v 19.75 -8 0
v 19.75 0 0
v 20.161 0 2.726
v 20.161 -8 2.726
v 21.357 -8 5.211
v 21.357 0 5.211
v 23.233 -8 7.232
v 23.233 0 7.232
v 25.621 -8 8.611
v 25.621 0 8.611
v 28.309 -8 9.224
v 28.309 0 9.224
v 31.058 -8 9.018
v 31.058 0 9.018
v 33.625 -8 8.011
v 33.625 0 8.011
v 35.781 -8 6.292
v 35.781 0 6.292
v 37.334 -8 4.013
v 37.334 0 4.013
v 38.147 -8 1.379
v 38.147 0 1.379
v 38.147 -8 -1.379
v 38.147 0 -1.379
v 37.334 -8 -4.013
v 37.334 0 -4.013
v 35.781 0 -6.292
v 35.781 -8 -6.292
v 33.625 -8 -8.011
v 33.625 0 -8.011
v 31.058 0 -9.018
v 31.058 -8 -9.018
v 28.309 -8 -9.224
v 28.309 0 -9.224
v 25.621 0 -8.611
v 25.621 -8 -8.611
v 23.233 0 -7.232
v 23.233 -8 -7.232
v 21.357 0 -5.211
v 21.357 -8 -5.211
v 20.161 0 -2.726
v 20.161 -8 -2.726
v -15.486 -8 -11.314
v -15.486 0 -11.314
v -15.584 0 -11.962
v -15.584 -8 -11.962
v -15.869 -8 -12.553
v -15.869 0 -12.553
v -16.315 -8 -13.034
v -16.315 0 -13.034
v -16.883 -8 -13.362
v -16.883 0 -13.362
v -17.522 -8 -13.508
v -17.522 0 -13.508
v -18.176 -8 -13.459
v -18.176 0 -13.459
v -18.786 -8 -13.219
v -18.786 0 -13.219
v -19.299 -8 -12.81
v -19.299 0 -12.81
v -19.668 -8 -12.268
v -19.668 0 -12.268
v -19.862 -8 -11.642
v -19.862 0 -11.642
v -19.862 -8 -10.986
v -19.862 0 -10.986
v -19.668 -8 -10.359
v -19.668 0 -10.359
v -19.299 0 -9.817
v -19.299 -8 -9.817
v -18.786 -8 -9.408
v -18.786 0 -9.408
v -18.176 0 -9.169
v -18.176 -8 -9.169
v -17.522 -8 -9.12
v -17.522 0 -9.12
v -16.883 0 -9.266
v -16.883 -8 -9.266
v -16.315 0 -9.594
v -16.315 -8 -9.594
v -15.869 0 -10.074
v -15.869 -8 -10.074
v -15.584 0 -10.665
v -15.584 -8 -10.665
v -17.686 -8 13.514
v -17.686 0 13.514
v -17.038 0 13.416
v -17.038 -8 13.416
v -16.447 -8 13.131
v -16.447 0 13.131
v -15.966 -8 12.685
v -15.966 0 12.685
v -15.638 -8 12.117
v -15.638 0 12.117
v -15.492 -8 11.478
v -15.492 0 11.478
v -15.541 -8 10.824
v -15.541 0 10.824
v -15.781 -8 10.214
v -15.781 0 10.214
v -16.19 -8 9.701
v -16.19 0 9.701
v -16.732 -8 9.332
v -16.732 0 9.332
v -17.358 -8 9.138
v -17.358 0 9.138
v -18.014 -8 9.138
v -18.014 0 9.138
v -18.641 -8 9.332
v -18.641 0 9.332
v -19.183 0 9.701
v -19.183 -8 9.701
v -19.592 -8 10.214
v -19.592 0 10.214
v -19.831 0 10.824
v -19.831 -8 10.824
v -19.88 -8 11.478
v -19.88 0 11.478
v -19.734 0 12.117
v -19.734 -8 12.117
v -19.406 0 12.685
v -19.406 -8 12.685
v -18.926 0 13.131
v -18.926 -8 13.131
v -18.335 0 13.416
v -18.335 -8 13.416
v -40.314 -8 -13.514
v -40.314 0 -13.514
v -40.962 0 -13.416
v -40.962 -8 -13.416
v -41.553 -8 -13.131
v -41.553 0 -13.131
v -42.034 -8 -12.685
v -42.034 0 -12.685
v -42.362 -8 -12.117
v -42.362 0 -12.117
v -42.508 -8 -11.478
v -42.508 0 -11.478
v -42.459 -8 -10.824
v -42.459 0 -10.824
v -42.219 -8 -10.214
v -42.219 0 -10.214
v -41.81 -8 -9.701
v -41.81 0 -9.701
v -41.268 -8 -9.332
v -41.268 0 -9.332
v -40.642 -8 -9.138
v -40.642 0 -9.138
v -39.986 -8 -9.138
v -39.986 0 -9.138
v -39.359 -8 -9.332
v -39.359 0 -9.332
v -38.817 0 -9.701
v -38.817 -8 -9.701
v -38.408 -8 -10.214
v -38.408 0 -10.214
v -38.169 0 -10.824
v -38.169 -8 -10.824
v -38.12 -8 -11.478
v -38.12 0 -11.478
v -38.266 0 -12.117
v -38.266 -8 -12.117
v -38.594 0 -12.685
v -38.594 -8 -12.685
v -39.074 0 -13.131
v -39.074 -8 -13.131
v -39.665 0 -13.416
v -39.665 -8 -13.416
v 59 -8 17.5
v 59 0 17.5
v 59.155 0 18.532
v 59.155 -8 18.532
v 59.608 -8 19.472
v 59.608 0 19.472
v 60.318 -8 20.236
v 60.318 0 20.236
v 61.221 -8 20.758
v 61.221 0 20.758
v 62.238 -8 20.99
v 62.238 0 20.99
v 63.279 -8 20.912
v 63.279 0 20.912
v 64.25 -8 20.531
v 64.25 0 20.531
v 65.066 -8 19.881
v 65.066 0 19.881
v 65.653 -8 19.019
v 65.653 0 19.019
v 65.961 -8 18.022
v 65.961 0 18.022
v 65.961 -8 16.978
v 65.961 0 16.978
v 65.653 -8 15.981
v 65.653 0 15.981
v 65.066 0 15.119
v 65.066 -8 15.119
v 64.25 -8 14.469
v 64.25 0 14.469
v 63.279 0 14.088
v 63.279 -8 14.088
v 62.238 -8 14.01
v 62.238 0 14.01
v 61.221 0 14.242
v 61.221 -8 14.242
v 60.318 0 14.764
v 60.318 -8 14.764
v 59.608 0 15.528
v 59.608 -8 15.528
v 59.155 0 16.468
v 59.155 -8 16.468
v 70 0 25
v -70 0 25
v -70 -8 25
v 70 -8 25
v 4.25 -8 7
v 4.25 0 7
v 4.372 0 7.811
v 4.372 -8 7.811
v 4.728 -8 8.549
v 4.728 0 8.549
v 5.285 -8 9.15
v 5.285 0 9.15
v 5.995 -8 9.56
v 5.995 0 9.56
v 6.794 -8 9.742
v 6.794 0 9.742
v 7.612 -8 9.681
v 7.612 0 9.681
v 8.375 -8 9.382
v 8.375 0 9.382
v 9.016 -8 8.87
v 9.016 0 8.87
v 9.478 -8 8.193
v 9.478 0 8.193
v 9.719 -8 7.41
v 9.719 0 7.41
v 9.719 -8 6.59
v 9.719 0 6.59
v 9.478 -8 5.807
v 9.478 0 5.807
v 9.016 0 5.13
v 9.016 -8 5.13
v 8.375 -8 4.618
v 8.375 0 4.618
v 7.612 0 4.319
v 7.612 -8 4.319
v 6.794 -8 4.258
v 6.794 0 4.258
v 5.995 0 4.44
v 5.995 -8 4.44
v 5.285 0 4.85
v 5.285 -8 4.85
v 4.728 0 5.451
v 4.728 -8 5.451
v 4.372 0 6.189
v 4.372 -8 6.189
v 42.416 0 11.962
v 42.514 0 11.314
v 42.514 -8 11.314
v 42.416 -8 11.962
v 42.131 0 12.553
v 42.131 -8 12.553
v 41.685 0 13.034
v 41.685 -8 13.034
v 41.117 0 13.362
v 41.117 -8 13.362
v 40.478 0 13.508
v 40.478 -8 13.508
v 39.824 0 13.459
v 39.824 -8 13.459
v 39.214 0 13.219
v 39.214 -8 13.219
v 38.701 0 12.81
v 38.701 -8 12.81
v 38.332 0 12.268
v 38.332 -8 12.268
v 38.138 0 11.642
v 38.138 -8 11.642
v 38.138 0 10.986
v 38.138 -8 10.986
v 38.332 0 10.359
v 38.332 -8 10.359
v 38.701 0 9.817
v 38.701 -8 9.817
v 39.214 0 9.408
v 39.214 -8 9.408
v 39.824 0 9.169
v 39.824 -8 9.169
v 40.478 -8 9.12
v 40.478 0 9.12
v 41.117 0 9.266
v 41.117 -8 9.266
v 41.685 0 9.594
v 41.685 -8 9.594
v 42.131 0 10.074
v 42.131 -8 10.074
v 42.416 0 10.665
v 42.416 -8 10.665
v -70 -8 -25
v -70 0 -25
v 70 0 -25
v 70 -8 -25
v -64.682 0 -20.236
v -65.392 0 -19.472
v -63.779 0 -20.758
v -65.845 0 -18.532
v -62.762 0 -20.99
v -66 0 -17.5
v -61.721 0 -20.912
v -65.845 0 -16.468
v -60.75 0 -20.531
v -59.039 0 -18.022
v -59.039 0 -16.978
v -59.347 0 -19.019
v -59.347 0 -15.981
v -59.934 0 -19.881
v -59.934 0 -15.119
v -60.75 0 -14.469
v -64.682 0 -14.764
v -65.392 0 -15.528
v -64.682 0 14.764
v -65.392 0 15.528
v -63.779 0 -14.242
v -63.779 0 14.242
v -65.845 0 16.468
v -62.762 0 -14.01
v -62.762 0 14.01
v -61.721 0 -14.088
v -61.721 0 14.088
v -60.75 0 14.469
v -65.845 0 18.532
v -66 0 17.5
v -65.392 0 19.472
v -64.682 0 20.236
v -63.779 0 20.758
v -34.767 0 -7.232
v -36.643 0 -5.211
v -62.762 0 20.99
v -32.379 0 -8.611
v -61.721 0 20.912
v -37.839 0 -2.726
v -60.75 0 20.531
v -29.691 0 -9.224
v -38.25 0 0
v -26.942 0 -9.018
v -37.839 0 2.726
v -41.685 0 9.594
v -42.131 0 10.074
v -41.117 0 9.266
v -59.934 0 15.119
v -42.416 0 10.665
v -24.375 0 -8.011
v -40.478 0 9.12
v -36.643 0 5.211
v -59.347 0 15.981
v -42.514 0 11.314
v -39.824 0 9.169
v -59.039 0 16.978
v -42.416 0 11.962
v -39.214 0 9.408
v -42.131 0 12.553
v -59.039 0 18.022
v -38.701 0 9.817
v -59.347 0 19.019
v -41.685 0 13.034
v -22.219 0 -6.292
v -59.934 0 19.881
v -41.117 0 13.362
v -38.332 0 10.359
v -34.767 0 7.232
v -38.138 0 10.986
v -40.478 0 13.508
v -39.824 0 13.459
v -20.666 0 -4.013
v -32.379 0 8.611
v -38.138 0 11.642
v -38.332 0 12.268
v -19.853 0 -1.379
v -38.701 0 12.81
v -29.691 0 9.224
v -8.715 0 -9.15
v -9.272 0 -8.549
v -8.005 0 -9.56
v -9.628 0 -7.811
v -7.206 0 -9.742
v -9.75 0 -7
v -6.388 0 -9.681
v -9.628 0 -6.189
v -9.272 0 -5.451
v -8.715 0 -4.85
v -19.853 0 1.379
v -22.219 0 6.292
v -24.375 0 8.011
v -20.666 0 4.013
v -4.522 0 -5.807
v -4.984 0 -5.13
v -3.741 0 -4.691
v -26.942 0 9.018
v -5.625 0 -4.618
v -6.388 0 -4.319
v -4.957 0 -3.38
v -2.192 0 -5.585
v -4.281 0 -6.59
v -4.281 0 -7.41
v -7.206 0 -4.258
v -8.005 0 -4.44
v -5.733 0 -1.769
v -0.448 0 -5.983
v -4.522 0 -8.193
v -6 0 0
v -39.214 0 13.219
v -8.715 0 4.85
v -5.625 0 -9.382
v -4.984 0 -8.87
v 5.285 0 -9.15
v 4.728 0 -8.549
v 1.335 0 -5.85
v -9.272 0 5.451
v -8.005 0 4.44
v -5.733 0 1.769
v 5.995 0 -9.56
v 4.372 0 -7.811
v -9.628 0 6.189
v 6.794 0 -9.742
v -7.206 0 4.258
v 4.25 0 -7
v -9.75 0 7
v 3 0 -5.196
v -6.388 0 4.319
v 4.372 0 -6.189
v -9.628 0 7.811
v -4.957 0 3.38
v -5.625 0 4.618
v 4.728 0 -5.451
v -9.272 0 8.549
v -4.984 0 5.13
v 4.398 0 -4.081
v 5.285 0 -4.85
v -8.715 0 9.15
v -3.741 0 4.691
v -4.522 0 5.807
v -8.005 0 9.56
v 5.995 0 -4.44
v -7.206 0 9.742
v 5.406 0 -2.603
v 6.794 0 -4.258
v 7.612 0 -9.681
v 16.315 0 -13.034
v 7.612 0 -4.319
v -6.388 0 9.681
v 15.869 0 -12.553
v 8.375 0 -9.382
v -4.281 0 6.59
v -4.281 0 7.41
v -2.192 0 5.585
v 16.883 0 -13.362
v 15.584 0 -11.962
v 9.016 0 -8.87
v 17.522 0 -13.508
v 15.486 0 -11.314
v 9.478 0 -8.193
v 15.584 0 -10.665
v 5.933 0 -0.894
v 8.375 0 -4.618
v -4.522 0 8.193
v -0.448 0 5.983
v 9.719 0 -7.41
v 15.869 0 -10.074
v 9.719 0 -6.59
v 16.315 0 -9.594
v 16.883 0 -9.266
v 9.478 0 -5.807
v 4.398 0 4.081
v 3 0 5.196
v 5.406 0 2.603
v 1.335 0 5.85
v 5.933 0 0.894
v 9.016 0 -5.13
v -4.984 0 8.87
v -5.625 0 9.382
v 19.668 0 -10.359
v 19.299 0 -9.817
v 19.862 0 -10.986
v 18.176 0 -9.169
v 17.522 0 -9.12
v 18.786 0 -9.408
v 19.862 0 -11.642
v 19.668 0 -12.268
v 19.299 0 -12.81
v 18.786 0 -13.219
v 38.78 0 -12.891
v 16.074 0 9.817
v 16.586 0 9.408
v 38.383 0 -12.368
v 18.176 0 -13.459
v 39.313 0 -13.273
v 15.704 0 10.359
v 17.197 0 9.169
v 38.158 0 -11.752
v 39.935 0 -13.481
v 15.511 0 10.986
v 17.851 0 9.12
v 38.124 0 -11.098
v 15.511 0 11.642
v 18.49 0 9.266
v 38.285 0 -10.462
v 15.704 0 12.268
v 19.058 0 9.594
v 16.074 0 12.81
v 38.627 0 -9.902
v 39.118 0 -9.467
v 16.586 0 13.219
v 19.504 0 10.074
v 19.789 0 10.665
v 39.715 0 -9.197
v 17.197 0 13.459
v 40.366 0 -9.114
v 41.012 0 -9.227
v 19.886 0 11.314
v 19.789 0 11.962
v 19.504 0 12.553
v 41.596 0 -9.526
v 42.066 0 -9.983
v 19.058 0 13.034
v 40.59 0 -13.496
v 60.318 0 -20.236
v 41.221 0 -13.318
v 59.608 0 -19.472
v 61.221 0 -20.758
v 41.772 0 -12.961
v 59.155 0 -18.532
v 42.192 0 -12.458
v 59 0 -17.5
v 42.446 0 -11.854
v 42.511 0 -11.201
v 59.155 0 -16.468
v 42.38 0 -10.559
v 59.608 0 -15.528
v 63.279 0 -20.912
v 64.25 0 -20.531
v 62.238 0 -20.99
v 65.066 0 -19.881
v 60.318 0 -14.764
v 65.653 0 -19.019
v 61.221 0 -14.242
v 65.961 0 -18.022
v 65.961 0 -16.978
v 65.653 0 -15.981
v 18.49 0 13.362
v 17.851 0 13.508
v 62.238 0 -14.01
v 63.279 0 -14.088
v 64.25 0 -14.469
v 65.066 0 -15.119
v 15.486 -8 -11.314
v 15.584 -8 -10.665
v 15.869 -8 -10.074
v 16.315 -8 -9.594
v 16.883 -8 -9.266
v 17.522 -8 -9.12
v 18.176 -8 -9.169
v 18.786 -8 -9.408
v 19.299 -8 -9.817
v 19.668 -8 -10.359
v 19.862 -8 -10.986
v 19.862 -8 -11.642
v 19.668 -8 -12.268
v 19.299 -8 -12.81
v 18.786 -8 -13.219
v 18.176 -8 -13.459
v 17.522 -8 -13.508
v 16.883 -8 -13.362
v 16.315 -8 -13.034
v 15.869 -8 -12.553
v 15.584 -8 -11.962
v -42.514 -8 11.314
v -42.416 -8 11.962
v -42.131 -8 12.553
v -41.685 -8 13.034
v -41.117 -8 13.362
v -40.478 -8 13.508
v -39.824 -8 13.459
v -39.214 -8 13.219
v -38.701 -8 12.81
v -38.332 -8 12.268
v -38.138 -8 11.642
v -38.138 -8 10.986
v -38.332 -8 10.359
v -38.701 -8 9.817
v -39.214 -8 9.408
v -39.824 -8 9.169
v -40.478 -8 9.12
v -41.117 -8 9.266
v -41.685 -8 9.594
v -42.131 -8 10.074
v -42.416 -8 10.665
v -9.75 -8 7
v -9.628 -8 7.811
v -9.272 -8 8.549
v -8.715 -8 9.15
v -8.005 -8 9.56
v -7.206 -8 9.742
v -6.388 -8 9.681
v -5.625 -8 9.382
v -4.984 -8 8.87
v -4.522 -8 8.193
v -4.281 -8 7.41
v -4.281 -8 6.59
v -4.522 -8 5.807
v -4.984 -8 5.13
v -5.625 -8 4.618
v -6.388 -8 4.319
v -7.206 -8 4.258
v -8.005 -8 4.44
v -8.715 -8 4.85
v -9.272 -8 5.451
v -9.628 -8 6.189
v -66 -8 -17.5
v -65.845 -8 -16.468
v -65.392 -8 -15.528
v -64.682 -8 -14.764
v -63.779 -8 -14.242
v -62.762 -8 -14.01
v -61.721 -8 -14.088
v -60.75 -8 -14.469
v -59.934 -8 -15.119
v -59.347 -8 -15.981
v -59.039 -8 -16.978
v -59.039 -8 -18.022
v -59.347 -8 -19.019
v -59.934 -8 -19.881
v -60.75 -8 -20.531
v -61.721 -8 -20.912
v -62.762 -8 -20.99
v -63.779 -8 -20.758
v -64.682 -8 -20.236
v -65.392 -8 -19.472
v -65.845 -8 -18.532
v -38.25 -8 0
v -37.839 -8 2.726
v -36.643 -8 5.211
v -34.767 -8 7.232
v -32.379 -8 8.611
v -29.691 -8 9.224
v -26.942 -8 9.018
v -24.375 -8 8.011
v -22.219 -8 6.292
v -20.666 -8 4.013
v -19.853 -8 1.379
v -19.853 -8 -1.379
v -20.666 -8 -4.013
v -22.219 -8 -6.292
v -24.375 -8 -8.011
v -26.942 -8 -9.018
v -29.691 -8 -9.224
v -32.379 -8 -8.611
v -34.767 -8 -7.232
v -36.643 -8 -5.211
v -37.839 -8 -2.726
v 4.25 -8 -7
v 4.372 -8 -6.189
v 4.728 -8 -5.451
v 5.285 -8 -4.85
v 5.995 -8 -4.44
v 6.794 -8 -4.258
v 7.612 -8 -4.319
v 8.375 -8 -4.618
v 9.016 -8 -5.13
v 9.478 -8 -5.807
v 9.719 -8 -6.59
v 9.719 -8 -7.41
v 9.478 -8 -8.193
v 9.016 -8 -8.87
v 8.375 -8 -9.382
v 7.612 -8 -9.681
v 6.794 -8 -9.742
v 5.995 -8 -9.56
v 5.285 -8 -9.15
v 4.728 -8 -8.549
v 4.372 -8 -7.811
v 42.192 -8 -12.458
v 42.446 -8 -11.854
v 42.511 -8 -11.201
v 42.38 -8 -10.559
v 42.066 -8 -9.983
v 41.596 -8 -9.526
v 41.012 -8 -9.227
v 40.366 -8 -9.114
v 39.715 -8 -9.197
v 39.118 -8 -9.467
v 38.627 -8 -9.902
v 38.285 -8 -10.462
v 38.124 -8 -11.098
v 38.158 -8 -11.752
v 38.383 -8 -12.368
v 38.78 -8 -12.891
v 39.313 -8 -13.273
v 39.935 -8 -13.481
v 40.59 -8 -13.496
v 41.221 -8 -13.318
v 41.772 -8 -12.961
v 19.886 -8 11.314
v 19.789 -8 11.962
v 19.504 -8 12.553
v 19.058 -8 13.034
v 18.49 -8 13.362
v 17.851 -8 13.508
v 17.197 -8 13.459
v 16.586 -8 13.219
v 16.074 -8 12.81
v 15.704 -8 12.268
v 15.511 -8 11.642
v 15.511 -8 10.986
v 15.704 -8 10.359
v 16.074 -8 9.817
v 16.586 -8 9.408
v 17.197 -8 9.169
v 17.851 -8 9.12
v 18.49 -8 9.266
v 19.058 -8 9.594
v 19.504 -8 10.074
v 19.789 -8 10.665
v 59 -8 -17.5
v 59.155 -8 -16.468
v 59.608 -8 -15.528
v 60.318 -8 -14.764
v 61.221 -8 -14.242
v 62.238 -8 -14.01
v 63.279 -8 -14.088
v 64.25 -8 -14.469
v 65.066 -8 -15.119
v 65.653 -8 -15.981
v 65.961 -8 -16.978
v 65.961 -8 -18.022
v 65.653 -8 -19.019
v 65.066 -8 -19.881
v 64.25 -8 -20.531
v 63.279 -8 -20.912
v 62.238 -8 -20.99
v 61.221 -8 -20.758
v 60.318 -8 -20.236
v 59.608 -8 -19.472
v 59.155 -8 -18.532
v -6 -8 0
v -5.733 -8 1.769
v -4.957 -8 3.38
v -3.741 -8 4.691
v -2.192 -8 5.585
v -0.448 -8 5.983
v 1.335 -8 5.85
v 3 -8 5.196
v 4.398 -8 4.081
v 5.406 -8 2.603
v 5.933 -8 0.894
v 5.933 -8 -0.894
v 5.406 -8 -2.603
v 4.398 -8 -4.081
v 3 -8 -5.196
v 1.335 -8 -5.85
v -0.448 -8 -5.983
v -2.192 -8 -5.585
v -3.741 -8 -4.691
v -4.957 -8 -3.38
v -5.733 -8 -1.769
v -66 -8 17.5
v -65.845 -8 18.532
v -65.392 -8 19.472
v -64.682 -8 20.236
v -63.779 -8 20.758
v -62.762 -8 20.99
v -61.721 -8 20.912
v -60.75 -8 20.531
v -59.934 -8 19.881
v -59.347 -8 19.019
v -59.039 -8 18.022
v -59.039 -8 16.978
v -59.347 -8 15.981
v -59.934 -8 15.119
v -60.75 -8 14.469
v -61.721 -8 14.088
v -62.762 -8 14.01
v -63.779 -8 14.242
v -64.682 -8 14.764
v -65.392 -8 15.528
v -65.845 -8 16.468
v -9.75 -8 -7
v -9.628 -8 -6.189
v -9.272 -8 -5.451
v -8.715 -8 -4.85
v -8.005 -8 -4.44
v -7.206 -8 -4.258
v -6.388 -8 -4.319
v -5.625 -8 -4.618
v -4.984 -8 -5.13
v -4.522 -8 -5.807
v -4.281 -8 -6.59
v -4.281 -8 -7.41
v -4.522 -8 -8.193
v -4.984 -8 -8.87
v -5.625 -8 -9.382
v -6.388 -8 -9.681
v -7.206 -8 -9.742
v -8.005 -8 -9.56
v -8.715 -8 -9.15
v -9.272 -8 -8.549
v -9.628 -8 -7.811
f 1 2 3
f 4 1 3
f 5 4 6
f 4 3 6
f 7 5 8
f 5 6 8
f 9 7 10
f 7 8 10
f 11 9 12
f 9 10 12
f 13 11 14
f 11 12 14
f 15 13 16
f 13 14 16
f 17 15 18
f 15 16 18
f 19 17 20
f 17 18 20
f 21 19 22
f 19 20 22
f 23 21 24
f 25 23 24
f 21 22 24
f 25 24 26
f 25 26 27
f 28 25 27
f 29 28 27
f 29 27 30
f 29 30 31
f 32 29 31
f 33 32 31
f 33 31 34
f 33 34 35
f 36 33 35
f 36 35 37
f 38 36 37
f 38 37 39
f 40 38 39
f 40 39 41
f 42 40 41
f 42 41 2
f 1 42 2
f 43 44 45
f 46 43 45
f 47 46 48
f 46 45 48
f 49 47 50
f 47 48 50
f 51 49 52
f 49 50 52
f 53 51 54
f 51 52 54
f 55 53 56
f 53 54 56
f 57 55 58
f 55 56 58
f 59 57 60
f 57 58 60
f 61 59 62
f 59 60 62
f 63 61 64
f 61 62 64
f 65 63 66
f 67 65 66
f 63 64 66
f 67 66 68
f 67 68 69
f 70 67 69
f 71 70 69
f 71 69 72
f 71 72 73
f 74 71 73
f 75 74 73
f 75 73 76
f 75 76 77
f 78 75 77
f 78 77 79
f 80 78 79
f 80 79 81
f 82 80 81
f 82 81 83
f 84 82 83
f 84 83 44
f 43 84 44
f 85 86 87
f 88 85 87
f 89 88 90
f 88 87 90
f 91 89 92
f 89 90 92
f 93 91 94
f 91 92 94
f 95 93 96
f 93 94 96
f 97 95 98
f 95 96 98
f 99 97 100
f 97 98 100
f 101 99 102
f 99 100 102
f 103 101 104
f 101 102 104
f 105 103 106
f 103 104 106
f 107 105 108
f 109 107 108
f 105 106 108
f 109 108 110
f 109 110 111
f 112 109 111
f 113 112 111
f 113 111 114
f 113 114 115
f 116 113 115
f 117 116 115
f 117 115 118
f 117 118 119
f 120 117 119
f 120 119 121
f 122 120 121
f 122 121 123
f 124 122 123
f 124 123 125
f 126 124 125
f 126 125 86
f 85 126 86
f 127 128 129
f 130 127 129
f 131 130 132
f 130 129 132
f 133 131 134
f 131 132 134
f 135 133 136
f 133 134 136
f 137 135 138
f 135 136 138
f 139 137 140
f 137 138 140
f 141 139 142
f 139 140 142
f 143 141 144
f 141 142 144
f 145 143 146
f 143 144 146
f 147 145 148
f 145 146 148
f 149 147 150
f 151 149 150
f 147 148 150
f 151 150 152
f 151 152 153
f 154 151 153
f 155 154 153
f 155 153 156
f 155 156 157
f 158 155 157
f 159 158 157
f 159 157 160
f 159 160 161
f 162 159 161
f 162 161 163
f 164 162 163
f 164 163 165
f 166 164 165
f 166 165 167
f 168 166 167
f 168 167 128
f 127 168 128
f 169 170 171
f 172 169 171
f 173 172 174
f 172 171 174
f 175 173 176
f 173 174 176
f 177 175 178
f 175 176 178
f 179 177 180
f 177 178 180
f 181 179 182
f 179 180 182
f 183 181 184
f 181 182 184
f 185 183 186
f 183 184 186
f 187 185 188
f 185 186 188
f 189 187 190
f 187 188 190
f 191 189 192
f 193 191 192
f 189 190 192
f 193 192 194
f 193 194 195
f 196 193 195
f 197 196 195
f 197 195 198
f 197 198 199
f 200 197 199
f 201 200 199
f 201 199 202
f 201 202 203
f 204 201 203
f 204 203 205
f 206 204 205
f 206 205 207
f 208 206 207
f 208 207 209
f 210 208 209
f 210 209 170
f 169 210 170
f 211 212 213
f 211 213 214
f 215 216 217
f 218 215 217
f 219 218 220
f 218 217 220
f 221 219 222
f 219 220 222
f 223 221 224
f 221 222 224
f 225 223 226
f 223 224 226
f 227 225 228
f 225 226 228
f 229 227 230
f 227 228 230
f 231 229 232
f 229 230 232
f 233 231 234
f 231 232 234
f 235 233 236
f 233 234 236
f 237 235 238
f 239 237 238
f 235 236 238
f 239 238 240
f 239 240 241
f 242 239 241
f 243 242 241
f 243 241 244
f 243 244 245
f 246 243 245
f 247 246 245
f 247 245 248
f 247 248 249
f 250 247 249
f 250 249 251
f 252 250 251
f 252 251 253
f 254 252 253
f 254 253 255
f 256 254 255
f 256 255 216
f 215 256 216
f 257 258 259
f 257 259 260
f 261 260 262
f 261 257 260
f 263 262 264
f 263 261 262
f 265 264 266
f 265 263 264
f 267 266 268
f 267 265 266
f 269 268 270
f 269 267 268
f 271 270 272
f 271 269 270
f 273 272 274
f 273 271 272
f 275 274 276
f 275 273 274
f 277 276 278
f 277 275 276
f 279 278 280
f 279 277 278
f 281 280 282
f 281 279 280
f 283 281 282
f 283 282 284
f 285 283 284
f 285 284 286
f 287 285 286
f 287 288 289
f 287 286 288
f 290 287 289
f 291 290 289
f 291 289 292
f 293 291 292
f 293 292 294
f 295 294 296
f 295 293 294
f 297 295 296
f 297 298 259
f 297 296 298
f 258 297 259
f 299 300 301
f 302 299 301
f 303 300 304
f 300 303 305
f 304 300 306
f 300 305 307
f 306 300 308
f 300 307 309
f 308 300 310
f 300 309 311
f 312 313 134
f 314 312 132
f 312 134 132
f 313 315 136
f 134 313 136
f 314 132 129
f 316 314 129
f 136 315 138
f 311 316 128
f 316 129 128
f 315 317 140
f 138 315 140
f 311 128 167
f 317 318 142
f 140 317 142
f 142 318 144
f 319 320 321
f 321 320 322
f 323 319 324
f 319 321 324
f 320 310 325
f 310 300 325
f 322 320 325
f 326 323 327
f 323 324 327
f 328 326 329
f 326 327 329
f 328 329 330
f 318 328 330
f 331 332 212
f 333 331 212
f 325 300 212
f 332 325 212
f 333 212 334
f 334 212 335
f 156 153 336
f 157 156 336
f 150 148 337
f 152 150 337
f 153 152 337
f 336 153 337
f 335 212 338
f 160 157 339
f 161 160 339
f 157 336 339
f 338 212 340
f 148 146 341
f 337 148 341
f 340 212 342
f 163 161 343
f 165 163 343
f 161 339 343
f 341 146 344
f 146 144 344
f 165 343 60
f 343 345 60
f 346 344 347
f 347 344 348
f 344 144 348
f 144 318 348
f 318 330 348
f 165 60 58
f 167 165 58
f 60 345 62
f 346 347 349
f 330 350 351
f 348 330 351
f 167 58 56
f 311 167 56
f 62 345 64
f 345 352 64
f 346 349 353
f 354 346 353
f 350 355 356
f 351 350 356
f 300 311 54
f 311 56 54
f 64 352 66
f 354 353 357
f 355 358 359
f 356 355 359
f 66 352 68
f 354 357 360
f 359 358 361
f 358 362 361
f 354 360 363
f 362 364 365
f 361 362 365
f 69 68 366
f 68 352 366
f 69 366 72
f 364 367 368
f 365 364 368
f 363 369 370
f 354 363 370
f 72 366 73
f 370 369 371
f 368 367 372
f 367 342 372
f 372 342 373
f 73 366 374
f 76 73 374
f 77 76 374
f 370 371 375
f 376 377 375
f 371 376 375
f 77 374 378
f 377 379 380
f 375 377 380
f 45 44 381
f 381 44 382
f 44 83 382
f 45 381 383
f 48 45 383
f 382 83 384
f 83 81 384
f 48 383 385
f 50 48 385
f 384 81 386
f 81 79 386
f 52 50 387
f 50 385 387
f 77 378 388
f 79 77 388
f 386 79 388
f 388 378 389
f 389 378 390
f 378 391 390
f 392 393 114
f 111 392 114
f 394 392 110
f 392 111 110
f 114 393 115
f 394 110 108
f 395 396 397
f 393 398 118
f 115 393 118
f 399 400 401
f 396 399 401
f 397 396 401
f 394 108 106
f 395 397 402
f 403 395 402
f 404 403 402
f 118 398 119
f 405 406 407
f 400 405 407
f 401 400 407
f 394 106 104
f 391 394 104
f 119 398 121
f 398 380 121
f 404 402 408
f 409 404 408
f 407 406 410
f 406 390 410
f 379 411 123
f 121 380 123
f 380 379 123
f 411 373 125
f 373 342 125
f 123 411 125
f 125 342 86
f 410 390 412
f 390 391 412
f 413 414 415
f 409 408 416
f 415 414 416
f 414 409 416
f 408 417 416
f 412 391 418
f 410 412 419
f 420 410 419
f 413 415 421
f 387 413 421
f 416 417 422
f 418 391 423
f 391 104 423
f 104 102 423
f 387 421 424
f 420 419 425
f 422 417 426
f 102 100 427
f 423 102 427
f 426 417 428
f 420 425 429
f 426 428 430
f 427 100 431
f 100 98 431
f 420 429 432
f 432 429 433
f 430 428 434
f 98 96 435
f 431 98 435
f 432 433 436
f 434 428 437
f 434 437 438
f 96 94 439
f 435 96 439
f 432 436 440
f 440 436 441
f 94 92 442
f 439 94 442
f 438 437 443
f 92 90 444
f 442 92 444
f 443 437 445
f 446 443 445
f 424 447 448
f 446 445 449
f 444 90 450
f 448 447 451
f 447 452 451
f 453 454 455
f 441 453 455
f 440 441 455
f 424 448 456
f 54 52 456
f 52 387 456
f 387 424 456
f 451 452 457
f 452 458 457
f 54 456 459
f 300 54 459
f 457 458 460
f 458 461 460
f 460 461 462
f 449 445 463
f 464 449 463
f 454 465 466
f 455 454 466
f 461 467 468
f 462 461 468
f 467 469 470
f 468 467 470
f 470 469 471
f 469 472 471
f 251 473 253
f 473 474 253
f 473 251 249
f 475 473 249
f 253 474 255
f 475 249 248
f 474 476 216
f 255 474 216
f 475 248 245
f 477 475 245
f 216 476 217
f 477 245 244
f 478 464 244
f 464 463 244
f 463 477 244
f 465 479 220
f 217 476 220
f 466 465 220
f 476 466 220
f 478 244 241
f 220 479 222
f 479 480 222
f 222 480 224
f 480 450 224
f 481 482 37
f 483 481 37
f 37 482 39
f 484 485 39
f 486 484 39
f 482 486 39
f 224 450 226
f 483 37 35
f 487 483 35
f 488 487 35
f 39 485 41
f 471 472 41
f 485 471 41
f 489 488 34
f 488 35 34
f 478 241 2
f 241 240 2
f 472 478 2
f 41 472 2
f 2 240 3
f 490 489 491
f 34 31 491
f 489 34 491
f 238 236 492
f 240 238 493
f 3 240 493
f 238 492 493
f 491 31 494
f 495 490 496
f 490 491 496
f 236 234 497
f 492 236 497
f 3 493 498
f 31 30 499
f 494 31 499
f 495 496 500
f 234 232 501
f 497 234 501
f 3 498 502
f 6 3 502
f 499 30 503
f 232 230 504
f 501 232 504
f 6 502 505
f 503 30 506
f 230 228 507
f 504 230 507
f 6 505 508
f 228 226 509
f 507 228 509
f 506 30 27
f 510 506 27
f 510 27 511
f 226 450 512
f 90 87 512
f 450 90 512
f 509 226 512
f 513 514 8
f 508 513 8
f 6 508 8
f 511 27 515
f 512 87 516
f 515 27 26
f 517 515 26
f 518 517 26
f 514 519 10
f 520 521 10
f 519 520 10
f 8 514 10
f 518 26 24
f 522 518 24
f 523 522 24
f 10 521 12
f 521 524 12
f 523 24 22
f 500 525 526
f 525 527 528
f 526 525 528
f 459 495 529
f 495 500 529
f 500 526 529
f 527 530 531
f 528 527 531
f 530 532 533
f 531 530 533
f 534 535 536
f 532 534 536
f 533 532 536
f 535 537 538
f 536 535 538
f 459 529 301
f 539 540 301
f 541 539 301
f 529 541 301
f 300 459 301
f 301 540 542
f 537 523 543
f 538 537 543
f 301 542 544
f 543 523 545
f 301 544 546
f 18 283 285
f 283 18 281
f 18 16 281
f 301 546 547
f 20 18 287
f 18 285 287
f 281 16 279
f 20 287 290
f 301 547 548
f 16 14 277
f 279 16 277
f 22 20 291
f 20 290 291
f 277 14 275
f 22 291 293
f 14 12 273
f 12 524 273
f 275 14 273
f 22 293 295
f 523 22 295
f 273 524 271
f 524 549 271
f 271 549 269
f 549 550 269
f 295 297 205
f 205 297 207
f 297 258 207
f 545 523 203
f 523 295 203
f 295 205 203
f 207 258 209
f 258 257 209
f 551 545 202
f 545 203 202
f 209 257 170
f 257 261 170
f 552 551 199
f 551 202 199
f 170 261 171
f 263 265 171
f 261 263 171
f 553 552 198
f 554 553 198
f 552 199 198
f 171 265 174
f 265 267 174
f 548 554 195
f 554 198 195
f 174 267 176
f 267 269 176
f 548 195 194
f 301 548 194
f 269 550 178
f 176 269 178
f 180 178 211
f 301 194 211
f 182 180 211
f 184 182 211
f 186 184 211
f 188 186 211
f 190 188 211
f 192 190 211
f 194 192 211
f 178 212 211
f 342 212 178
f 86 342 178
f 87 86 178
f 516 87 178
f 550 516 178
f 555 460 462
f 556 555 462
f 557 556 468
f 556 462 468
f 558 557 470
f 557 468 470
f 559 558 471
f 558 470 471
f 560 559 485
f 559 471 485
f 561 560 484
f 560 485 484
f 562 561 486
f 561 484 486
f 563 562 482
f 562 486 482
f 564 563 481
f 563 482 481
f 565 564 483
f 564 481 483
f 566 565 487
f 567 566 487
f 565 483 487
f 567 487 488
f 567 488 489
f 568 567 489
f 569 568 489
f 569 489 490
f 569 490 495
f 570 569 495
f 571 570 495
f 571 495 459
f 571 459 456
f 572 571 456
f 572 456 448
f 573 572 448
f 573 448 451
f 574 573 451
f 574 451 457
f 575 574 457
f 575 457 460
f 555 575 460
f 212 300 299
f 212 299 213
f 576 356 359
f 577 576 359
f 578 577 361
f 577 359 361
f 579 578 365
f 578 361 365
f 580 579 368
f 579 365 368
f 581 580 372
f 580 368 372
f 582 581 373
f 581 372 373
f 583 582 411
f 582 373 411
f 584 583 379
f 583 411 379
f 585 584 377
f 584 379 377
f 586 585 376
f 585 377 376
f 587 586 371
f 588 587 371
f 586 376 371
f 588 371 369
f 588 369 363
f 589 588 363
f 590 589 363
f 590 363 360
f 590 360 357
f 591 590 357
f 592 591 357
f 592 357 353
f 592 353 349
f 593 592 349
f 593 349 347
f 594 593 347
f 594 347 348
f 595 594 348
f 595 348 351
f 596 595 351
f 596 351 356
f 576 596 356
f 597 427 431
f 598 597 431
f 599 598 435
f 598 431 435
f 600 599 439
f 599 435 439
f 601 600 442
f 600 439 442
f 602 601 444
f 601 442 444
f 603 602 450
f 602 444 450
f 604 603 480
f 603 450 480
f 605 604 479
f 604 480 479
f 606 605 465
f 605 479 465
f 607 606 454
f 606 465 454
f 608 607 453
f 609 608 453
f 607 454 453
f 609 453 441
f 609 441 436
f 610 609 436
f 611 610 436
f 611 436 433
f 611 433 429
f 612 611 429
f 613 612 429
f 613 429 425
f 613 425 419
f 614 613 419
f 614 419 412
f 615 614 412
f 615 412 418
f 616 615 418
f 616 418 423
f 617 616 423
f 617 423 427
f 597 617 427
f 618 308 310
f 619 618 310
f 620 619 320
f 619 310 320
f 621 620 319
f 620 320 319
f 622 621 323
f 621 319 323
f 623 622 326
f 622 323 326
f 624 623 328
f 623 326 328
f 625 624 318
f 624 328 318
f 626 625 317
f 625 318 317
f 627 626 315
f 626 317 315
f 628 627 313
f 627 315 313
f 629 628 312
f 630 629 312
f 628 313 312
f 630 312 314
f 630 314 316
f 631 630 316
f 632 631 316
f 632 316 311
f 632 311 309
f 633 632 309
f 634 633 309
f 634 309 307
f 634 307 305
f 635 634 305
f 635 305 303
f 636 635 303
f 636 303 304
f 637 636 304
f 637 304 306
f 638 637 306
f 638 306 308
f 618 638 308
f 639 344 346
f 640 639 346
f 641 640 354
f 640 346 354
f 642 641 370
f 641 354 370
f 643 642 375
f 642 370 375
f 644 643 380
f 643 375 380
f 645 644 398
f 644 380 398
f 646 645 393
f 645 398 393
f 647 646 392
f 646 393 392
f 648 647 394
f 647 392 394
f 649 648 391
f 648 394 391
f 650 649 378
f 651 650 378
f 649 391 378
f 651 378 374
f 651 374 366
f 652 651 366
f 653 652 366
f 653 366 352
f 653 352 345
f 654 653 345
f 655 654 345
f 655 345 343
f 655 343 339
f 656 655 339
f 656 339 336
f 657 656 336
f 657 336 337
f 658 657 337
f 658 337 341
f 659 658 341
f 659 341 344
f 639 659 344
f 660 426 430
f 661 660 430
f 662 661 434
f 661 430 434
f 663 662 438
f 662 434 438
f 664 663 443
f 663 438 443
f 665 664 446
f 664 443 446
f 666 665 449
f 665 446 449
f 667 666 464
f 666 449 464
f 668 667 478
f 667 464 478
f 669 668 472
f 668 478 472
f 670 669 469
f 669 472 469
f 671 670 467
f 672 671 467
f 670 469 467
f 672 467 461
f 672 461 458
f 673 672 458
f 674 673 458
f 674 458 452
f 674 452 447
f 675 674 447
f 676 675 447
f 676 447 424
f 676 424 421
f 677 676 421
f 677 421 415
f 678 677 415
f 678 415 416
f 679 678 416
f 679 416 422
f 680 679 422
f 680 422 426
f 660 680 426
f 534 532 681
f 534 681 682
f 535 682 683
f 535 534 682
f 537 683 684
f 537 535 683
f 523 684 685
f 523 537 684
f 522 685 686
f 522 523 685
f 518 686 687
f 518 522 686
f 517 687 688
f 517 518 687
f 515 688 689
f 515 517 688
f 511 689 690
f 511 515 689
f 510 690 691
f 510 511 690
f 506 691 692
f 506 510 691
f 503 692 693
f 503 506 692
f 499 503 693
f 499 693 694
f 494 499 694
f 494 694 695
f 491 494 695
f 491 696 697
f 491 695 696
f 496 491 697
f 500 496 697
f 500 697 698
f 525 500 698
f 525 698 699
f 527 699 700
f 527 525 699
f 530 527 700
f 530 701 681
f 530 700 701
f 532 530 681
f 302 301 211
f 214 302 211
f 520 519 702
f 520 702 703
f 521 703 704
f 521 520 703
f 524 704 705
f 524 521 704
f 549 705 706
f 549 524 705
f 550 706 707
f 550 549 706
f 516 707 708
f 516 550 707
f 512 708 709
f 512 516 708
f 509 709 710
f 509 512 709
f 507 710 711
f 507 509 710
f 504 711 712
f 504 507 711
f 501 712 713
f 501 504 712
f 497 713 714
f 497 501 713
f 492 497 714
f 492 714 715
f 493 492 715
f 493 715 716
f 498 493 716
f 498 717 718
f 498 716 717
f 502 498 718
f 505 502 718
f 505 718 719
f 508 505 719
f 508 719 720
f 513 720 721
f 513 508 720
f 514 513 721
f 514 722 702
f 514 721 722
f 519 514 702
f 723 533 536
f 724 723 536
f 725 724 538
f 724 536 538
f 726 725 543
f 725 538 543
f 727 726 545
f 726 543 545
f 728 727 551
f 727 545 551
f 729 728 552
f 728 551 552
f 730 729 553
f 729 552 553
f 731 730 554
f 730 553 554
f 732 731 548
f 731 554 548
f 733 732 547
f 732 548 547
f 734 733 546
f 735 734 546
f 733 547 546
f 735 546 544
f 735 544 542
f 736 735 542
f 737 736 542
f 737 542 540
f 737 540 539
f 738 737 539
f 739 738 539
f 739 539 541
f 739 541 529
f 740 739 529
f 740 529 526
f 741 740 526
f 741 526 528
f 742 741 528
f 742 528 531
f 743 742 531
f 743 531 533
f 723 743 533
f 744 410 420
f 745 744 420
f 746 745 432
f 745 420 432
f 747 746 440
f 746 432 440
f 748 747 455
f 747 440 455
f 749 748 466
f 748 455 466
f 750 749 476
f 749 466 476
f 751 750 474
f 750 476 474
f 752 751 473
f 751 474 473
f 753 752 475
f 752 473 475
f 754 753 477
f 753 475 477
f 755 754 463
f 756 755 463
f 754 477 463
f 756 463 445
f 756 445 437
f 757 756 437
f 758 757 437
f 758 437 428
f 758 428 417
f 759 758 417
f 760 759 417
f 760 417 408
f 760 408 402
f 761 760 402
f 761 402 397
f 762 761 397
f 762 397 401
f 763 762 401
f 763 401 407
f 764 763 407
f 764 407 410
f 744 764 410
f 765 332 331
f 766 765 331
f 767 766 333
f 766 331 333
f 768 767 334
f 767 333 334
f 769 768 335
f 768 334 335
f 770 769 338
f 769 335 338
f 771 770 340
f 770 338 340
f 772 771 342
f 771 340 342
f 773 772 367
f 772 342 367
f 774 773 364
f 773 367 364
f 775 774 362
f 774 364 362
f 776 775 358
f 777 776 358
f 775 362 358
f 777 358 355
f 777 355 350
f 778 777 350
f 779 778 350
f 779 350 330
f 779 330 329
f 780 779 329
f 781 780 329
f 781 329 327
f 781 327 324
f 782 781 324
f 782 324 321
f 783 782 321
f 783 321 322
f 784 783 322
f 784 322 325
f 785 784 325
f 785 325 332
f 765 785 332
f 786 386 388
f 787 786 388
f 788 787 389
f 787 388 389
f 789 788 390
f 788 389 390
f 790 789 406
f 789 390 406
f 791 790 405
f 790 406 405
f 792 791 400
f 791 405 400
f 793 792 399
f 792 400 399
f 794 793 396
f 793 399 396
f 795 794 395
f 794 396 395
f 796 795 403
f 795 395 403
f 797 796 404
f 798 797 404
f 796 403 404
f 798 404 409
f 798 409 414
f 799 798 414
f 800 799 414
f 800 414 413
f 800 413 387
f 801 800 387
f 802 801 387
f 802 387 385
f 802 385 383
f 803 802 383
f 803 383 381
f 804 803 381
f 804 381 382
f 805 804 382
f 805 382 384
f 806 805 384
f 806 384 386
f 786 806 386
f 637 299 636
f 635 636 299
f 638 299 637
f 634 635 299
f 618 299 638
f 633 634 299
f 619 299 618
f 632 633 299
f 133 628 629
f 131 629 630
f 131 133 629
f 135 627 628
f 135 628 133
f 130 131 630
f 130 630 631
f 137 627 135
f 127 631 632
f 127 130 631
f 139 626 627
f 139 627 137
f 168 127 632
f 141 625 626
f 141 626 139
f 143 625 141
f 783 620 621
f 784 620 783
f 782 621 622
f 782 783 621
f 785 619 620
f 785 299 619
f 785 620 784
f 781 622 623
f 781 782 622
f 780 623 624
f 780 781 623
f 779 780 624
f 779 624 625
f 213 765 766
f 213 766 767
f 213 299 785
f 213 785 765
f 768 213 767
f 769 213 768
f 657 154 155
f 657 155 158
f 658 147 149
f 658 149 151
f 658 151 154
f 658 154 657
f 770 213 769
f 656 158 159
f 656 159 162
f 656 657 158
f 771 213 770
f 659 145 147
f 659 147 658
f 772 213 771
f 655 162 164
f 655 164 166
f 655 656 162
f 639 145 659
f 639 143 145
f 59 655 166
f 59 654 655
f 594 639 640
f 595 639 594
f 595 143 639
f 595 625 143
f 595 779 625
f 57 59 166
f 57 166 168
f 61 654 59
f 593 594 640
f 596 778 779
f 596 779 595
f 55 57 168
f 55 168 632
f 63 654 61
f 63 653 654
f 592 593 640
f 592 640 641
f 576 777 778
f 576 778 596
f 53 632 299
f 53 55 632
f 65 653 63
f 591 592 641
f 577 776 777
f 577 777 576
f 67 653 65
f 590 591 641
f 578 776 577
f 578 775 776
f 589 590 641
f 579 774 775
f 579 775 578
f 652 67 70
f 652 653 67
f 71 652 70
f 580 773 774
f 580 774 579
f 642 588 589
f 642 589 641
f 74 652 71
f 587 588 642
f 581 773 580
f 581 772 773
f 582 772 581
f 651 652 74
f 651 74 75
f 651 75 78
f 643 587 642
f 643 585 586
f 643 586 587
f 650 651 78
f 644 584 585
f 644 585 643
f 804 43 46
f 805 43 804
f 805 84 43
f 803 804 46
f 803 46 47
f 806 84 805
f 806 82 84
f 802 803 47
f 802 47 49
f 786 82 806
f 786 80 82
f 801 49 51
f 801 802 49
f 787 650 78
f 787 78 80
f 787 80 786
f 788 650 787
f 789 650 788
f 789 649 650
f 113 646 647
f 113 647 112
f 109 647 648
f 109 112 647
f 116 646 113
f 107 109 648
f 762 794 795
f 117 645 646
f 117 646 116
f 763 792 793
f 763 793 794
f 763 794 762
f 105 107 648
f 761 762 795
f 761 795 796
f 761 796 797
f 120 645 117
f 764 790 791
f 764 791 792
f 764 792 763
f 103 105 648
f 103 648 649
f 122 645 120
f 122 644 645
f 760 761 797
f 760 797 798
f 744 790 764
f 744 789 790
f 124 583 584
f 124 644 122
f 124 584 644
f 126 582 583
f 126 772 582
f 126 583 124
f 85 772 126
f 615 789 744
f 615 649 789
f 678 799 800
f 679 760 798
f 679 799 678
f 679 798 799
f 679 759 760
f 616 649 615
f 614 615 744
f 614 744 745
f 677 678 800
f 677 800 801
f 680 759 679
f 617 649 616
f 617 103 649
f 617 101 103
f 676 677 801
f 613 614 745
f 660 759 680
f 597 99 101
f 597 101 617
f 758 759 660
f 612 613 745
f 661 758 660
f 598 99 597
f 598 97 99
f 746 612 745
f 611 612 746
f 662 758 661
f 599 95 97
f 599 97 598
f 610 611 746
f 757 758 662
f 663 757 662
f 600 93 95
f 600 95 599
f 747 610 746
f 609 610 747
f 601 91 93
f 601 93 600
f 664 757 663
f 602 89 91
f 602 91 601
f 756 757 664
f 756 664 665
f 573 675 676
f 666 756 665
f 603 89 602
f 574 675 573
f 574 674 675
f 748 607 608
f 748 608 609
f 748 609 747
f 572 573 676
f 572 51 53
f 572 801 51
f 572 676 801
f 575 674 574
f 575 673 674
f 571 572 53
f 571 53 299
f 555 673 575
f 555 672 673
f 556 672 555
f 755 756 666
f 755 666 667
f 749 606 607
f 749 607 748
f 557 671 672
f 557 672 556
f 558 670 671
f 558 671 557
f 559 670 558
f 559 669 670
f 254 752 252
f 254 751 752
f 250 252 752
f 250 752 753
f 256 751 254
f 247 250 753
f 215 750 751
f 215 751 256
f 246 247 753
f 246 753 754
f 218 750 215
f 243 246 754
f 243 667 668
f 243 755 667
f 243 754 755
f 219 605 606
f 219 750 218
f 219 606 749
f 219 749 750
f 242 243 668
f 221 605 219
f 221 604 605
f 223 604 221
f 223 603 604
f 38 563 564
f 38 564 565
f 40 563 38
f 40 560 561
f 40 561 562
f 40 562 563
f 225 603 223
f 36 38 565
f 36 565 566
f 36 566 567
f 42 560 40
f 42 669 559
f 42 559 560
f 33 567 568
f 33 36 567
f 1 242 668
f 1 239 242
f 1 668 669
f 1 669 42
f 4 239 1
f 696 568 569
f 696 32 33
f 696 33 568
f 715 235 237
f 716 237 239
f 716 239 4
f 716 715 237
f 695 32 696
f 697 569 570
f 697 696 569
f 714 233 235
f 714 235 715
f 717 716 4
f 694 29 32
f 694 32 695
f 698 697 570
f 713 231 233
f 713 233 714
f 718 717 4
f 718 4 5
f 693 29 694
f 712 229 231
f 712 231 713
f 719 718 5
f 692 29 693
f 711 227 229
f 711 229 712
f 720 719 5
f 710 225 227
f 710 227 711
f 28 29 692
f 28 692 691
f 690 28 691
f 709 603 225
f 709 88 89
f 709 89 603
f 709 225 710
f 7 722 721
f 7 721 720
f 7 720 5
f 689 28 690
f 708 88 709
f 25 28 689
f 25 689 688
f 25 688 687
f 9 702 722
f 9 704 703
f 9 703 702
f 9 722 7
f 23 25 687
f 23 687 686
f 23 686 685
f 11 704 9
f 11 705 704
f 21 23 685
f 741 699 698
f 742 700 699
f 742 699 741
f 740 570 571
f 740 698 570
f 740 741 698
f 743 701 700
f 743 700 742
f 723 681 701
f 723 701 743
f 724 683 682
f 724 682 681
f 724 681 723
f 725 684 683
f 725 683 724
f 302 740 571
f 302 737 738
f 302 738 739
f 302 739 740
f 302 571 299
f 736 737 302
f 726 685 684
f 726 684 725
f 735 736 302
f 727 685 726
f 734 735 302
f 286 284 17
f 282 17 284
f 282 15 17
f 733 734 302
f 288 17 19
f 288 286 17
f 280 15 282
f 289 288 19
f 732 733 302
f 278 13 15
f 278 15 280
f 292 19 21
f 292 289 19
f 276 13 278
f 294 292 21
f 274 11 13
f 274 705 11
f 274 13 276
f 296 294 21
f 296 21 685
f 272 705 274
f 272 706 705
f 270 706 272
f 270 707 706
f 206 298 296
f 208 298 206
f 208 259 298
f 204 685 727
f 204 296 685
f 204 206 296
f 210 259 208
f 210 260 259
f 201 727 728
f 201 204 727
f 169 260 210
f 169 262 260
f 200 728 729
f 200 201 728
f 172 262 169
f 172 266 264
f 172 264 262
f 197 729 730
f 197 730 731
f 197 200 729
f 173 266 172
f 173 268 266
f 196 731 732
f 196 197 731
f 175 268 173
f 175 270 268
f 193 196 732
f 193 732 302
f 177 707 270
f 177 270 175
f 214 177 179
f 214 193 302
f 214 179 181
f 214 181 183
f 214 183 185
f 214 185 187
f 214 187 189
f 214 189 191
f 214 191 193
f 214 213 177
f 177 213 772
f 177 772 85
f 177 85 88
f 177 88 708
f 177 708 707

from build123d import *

# Parameters (mm, degrees)
F0_W             = 140
F0_H             = 50
F1_DEPTH         = 8
F3_D             = 12
F4_D             = 5.5
F5_D             = 7
F6_D             = 18.5
F7_D             = 4.4
F7_COPIES_COUNT  = 4
F7_COPIES4_COUNT = 2
F7_COPIES4_PITCH = 62.25753


# Not quite as in the source:
# - a pattern or mirror of a feature is missing from the dataset's text; its kind, count and spacing are read off the source's solid


with BuildPart() as f1:
    # F0 (on Front) → F1 (new body)
    with BuildSketch(Plane.XZ):
        Rectangle(F0_W, F0_H)
    extrude(amount=F1_DEPTH)

    # F3 (through all)
    with Locations(Plane.XZ.offset(8)):
        with Locations((0, 0)):
            Hole(F3_D / 2)

    # F4 (through all)
    with Locations(Plane.XZ.offset(8)):
        with Locations((-7, 7), (-7, -7), (7, -7), (7, 7)):
            Hole(F4_D / 2)

    # F5 (through all)
    with Locations(Plane.XZ.offset(8)):
        with Locations((-62.5, -17.5), (62.5, -17.5), (62.5, 17.5), (-62.5, 17.5)):
            Hole(F5_D / 2)

    # F6 (through all)
    with Locations(Plane.XZ.offset(8)):
        with Locations((-29, 0), (29, 0)):
            Hole(F6_D / 2)

    # F7 (through all)
    with Locations(Plane.XZ.offset(8)):
        with Locations((-40.313708499, 11.313708499)):
            f7 = Hole(F7_D / 2)

    # F7_copies: F7 ×4 about axis
    f7_copies_axis = Axis((-29, 0, 0), (0, 1, 0))
    for i in range(1, F7_COPIES_COUNT):
        add(f7.rotate(f7_copies_axis, i * 360 / F7_COPIES_COUNT), mode=Mode.SUBTRACT)

    # F7_copies1: F7 across plane
    add(f7.mirror(Plane(origin=(0, 0, 0), x_dir=(0, 0, 1), z_dir=(1, 0, 0))), mode=Mode.SUBTRACT)

    # F7_copies2: F7 across plane
    add(f7.mirror(Plane(origin=(-11.313708, 0, 0), x_dir=(0, 0, 1), z_dir=(1, 0, 0))), mode=Mode.SUBTRACT)

    # F7_copies3: F7 across plane
    add(f7.mirror(Plane(origin=(0, 0, 0), x_dir=(0.2702028103, 0, 0.9628034282), z_dir=(0.9628034282, 0, -0.2702028103))), mode=Mode.SUBTRACT)

    # F7_copies4: F7 ×2
    with Locations(*[Vector(0.931614221, 0, -0.3634486803) * (i * F7_COPIES4_PITCH) for i in range(1, F7_COPIES4_COUNT)]):
        add(f7, mode=Mode.SUBTRACT)


solid = f1.part
